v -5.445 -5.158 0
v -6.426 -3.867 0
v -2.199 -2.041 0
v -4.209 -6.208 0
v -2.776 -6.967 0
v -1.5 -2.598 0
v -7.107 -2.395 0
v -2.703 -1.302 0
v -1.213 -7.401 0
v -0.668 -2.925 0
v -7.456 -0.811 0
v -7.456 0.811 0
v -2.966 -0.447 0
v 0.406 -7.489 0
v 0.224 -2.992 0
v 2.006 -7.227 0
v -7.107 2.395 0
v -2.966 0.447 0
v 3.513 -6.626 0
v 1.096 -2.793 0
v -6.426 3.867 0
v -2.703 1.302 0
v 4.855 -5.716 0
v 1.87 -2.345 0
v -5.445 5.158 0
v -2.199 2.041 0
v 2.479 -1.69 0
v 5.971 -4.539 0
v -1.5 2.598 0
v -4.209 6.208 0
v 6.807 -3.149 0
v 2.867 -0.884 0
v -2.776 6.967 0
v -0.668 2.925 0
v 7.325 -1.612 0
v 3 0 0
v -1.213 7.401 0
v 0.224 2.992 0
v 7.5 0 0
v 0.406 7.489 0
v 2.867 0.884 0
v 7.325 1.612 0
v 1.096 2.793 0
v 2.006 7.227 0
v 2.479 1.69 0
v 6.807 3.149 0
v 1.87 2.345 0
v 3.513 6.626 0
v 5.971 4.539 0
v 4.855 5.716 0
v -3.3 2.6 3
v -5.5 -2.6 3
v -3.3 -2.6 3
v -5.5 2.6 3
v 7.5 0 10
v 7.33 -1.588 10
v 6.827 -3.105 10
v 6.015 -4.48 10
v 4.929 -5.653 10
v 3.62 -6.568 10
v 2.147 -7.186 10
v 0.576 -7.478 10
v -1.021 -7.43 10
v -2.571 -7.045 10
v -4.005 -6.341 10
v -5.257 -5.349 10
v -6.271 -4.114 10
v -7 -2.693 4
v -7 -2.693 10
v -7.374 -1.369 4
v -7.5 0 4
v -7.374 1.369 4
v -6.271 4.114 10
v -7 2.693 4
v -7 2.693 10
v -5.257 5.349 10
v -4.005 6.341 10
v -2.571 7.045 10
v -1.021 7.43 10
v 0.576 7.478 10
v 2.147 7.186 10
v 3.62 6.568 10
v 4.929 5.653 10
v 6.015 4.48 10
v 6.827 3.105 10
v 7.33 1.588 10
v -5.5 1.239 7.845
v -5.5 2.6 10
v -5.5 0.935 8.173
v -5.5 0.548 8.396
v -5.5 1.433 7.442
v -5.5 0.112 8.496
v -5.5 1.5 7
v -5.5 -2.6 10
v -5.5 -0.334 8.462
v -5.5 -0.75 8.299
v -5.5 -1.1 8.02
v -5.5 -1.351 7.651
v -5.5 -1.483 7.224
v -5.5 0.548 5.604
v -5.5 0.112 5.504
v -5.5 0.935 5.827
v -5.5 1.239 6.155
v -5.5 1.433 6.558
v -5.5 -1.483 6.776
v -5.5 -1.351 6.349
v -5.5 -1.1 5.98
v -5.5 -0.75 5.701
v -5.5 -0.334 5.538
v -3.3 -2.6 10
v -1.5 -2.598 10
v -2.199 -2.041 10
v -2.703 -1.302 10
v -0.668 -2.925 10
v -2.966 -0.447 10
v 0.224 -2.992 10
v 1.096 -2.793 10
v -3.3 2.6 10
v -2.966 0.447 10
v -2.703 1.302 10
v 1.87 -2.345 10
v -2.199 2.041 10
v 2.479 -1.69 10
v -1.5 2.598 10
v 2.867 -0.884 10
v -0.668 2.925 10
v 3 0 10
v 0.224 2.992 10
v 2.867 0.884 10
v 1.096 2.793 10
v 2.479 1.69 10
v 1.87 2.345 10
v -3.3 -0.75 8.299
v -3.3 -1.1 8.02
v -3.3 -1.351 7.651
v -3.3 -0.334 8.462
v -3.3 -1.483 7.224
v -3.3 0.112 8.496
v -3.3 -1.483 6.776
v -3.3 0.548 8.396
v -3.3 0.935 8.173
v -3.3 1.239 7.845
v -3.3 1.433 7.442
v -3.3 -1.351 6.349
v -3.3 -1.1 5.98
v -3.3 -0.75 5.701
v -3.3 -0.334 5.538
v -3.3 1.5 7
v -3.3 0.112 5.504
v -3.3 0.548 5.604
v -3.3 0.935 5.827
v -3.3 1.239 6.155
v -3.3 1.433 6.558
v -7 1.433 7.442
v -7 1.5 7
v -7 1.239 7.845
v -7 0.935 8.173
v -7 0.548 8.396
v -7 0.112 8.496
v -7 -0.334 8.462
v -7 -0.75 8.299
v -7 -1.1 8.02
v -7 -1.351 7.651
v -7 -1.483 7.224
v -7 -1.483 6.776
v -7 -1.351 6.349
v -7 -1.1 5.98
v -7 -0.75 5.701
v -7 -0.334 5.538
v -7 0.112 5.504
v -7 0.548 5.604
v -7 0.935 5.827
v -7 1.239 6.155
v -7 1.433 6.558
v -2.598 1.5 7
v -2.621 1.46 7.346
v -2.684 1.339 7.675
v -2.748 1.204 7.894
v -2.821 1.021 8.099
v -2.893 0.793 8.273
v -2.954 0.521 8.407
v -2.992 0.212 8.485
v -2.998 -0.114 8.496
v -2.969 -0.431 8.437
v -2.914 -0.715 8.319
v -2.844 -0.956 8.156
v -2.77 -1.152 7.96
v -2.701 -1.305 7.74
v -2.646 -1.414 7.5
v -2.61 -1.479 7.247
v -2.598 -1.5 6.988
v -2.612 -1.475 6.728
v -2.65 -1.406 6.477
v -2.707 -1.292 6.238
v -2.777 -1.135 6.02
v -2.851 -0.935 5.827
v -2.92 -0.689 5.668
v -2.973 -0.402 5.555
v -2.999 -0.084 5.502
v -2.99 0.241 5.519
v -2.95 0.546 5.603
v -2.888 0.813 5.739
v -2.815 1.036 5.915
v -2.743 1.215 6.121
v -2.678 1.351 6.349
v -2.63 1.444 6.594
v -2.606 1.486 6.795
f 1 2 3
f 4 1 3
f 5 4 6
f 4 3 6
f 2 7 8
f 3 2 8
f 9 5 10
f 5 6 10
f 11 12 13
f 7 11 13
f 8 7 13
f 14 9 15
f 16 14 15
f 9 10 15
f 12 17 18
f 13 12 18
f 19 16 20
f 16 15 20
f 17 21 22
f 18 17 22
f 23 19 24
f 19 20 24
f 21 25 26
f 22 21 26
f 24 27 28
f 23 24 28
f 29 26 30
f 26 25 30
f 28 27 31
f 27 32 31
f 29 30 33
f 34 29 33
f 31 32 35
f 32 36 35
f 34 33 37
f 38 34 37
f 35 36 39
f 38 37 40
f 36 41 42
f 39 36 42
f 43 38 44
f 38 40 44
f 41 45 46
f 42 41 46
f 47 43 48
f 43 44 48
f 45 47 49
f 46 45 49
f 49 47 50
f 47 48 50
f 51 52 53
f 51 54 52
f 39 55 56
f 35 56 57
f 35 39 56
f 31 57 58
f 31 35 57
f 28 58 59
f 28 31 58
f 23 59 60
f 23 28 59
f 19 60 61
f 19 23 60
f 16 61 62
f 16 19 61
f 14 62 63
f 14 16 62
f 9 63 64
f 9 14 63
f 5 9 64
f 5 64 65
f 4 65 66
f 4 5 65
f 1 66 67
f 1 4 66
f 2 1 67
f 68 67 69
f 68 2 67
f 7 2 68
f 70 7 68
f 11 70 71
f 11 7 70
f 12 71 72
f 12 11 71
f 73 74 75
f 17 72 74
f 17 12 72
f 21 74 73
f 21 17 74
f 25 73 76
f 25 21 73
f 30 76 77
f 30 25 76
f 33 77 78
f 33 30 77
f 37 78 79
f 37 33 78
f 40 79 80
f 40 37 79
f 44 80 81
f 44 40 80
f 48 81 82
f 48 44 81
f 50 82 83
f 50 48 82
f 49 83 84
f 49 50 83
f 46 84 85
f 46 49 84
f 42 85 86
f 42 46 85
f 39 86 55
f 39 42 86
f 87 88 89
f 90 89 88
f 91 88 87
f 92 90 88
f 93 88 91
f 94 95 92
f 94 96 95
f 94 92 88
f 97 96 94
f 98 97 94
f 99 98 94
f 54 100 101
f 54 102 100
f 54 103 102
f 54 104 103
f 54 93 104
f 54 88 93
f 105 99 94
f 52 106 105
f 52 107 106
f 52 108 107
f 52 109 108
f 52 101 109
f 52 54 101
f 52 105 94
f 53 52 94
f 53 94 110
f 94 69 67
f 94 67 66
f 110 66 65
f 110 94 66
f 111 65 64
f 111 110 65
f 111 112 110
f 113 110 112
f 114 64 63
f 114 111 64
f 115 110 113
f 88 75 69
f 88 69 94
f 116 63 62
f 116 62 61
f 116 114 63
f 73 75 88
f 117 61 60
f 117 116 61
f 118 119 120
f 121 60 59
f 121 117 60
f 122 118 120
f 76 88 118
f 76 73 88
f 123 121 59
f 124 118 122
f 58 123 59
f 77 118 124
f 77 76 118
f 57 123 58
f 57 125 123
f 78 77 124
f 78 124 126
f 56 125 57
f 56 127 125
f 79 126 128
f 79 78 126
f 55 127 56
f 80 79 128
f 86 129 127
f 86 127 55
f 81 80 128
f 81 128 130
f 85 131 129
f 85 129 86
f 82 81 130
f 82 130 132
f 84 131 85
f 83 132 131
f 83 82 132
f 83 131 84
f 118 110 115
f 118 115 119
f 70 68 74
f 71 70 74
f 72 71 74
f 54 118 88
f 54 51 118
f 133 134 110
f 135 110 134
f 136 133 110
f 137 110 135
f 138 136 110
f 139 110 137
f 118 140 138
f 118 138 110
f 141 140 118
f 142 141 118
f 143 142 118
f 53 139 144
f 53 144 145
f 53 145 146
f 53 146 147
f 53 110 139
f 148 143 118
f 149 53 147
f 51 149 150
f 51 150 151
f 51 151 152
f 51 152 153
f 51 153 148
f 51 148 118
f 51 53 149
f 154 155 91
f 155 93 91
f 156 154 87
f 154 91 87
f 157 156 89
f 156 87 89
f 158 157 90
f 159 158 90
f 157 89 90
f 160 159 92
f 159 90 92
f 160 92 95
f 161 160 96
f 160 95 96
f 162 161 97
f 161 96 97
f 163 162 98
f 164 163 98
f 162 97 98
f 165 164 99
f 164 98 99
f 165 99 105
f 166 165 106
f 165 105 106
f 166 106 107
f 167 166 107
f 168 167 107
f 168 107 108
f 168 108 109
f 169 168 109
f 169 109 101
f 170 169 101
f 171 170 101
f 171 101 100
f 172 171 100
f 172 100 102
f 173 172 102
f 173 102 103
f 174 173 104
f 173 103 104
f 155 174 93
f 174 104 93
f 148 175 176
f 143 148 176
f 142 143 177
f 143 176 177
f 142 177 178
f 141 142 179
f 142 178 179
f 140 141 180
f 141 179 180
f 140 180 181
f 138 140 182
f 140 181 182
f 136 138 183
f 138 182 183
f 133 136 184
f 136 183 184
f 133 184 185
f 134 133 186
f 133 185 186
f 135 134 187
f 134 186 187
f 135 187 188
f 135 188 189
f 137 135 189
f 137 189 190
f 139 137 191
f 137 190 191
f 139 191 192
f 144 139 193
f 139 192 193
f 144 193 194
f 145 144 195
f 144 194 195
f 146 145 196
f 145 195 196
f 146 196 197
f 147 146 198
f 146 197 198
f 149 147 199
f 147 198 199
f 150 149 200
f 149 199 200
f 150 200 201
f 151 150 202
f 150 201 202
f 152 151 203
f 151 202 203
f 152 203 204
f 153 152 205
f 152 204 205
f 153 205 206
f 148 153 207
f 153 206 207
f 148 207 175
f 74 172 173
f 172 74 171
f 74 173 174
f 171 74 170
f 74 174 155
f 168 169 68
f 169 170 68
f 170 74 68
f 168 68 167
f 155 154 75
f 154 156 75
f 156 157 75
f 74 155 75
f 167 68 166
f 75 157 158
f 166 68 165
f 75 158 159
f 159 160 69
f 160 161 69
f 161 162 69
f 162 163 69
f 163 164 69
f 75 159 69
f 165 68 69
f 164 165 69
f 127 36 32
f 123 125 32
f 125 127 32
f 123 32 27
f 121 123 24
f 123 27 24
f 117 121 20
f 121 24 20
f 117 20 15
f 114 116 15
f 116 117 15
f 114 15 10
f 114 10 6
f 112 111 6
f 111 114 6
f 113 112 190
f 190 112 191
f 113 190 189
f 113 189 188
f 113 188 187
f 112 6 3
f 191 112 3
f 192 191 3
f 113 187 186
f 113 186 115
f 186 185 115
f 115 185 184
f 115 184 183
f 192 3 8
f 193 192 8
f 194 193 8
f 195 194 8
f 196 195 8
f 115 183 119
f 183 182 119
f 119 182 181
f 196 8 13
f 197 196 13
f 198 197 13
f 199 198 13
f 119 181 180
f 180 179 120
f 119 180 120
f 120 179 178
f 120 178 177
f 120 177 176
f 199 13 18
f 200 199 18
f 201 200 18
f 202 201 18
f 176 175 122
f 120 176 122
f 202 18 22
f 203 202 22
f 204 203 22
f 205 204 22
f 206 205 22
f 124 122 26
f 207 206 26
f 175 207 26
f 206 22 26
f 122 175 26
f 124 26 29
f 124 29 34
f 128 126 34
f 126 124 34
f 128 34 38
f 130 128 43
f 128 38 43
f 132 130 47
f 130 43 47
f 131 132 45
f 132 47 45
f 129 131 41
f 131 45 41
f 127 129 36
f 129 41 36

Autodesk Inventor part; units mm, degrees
ref_plane "YZ Plane" through (0, 0, 0) normal (1, 0, 0) x (0, 1, 0)
ref_plane "XZ Plane" through (0, 0, 0) normal (0, 1, 0) x (-1, 0, 0)
sketch "Sketch1" plane through (0, 0, 0) normal (0, 0, 1) x (1, 0, 0)
  circle A0 centre (0, 0) radius 7.5
  circle A1 centre (0, 0) radius 3
  dimension "d0" = 15
  dimension "d1" = 6
extrude "Extrusion1" add sketch "Sketch1" along normal blind 10
ref_plane "Work Plane1" through (0, 0, 3) normal (0, 0, 1) x (1, 0, 0)
sketch "Sketch2" plane through (0, 0, 3) normal (0, 0, 1) x (1, 0, 0)
  line L0 (-5.5, -2.6) -> (-3.3, -2.6)
  line L1 (-3.3, -2.6) -> (-3.3, 2.6)
  line L2 (-3.3, 2.6) -> (-5.5, 2.6)
  line L3 (-5.5, 2.6) -> (-5.5, -2.6)
  point P0 (0, 0)
  point P1 (-5.5, 0)
  dimension "d5" = 5.5
  dimension "d6" = 2.2
  dimension "d7" = 5.2
extrude "Extrusion2" cut sketch "Sketch2" along normal blind 7
sketch "Sketch4" plane through (0, 0, 0) normal (1, 0, 0) x (0, 1, 0)
  circle A0 centre (0, 7) radius 1.5
  line L0 (-2.1, 0) -> (2.1, 0) projected
  point P0 (0, 0)
  dimension "d12" = 3
  dimension "d13" = 7
extrude "Extrusion3" cut sketch "Sketch4" against normal blind 8
sketch "Sketch5" plane through (0, 0, 0) normal (0, 1, 0) x (-1, 0, 0)
  line L0 (7.5, 0) -> (7.5, 10) projected
  line L1 (7.5, 4) -> (7, 4)
  line L2 (7, 4) -> (7, 10)
  line L3 (7, 10) -> (7.5, 10)
  line L4 (7.5, 10) -> (7.5, 4)
  line L5 (-1.5, 0) -> (9, 0) projected
  point P0 (0, 0)
  dimension "d16" = 6
  dimension "d17" = 10
  dimension "d18" = 0.5
extrude "Extrusion4" cut sketch "Sketch5" along normal mid plane 8
sketch "Sketch6" plane through (0, 0, 0) normal (0, 0, -1) x (-1, 0, 0)
  point P0 (0, 0)
properties part number "Acople eje motor"
